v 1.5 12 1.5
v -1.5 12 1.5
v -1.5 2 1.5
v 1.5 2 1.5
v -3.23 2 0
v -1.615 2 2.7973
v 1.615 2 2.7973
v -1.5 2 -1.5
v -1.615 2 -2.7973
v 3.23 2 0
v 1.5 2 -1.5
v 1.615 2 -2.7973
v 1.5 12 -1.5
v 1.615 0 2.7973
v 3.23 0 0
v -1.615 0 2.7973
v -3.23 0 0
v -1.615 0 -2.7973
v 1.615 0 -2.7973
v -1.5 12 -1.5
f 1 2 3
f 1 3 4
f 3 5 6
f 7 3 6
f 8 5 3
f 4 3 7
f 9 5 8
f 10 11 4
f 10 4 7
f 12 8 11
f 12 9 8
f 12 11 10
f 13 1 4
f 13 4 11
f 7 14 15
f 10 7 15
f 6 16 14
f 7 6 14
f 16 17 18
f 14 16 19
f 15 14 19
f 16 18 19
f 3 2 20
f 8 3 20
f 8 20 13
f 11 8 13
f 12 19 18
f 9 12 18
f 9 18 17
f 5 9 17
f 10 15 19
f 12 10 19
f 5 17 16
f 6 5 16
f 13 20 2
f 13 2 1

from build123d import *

# Parameters (mm, degrees)
EXTRUDE_1_DEPTH = 2
SKETCH_2_W      = 3
SKETCH_2_H      = 3
EXTRUDE_2_DEPTH = 10


with BuildPart() as part:
    # 스케치1 → 보스-돌출1 (new body)
    with BuildSketch(Plane(origin=(0, 0, 0), x_dir=(1, 0, 0), z_dir=(0, 1, 0))):
        Polygon((3.23, 0), (1.615, 2.797262054), (-1.615, 2.797262054), (-3.23, 0), (-1.615, -2.797262054), (1.615, -2.797262054), align=None)
    extrude(amount=EXTRUDE_1_DEPTH)

    # 스케치2 → 보스-돌출2 (add)
    with BuildSketch(Plane(origin=(0, 2, 0), x_dir=(1, 0, 0), z_dir=(0, 1, 0))):
        Rectangle(SKETCH_2_W, SKETCH_2_H)
    extrude(amount=EXTRUDE_2_DEPTH)


solid = part.part
